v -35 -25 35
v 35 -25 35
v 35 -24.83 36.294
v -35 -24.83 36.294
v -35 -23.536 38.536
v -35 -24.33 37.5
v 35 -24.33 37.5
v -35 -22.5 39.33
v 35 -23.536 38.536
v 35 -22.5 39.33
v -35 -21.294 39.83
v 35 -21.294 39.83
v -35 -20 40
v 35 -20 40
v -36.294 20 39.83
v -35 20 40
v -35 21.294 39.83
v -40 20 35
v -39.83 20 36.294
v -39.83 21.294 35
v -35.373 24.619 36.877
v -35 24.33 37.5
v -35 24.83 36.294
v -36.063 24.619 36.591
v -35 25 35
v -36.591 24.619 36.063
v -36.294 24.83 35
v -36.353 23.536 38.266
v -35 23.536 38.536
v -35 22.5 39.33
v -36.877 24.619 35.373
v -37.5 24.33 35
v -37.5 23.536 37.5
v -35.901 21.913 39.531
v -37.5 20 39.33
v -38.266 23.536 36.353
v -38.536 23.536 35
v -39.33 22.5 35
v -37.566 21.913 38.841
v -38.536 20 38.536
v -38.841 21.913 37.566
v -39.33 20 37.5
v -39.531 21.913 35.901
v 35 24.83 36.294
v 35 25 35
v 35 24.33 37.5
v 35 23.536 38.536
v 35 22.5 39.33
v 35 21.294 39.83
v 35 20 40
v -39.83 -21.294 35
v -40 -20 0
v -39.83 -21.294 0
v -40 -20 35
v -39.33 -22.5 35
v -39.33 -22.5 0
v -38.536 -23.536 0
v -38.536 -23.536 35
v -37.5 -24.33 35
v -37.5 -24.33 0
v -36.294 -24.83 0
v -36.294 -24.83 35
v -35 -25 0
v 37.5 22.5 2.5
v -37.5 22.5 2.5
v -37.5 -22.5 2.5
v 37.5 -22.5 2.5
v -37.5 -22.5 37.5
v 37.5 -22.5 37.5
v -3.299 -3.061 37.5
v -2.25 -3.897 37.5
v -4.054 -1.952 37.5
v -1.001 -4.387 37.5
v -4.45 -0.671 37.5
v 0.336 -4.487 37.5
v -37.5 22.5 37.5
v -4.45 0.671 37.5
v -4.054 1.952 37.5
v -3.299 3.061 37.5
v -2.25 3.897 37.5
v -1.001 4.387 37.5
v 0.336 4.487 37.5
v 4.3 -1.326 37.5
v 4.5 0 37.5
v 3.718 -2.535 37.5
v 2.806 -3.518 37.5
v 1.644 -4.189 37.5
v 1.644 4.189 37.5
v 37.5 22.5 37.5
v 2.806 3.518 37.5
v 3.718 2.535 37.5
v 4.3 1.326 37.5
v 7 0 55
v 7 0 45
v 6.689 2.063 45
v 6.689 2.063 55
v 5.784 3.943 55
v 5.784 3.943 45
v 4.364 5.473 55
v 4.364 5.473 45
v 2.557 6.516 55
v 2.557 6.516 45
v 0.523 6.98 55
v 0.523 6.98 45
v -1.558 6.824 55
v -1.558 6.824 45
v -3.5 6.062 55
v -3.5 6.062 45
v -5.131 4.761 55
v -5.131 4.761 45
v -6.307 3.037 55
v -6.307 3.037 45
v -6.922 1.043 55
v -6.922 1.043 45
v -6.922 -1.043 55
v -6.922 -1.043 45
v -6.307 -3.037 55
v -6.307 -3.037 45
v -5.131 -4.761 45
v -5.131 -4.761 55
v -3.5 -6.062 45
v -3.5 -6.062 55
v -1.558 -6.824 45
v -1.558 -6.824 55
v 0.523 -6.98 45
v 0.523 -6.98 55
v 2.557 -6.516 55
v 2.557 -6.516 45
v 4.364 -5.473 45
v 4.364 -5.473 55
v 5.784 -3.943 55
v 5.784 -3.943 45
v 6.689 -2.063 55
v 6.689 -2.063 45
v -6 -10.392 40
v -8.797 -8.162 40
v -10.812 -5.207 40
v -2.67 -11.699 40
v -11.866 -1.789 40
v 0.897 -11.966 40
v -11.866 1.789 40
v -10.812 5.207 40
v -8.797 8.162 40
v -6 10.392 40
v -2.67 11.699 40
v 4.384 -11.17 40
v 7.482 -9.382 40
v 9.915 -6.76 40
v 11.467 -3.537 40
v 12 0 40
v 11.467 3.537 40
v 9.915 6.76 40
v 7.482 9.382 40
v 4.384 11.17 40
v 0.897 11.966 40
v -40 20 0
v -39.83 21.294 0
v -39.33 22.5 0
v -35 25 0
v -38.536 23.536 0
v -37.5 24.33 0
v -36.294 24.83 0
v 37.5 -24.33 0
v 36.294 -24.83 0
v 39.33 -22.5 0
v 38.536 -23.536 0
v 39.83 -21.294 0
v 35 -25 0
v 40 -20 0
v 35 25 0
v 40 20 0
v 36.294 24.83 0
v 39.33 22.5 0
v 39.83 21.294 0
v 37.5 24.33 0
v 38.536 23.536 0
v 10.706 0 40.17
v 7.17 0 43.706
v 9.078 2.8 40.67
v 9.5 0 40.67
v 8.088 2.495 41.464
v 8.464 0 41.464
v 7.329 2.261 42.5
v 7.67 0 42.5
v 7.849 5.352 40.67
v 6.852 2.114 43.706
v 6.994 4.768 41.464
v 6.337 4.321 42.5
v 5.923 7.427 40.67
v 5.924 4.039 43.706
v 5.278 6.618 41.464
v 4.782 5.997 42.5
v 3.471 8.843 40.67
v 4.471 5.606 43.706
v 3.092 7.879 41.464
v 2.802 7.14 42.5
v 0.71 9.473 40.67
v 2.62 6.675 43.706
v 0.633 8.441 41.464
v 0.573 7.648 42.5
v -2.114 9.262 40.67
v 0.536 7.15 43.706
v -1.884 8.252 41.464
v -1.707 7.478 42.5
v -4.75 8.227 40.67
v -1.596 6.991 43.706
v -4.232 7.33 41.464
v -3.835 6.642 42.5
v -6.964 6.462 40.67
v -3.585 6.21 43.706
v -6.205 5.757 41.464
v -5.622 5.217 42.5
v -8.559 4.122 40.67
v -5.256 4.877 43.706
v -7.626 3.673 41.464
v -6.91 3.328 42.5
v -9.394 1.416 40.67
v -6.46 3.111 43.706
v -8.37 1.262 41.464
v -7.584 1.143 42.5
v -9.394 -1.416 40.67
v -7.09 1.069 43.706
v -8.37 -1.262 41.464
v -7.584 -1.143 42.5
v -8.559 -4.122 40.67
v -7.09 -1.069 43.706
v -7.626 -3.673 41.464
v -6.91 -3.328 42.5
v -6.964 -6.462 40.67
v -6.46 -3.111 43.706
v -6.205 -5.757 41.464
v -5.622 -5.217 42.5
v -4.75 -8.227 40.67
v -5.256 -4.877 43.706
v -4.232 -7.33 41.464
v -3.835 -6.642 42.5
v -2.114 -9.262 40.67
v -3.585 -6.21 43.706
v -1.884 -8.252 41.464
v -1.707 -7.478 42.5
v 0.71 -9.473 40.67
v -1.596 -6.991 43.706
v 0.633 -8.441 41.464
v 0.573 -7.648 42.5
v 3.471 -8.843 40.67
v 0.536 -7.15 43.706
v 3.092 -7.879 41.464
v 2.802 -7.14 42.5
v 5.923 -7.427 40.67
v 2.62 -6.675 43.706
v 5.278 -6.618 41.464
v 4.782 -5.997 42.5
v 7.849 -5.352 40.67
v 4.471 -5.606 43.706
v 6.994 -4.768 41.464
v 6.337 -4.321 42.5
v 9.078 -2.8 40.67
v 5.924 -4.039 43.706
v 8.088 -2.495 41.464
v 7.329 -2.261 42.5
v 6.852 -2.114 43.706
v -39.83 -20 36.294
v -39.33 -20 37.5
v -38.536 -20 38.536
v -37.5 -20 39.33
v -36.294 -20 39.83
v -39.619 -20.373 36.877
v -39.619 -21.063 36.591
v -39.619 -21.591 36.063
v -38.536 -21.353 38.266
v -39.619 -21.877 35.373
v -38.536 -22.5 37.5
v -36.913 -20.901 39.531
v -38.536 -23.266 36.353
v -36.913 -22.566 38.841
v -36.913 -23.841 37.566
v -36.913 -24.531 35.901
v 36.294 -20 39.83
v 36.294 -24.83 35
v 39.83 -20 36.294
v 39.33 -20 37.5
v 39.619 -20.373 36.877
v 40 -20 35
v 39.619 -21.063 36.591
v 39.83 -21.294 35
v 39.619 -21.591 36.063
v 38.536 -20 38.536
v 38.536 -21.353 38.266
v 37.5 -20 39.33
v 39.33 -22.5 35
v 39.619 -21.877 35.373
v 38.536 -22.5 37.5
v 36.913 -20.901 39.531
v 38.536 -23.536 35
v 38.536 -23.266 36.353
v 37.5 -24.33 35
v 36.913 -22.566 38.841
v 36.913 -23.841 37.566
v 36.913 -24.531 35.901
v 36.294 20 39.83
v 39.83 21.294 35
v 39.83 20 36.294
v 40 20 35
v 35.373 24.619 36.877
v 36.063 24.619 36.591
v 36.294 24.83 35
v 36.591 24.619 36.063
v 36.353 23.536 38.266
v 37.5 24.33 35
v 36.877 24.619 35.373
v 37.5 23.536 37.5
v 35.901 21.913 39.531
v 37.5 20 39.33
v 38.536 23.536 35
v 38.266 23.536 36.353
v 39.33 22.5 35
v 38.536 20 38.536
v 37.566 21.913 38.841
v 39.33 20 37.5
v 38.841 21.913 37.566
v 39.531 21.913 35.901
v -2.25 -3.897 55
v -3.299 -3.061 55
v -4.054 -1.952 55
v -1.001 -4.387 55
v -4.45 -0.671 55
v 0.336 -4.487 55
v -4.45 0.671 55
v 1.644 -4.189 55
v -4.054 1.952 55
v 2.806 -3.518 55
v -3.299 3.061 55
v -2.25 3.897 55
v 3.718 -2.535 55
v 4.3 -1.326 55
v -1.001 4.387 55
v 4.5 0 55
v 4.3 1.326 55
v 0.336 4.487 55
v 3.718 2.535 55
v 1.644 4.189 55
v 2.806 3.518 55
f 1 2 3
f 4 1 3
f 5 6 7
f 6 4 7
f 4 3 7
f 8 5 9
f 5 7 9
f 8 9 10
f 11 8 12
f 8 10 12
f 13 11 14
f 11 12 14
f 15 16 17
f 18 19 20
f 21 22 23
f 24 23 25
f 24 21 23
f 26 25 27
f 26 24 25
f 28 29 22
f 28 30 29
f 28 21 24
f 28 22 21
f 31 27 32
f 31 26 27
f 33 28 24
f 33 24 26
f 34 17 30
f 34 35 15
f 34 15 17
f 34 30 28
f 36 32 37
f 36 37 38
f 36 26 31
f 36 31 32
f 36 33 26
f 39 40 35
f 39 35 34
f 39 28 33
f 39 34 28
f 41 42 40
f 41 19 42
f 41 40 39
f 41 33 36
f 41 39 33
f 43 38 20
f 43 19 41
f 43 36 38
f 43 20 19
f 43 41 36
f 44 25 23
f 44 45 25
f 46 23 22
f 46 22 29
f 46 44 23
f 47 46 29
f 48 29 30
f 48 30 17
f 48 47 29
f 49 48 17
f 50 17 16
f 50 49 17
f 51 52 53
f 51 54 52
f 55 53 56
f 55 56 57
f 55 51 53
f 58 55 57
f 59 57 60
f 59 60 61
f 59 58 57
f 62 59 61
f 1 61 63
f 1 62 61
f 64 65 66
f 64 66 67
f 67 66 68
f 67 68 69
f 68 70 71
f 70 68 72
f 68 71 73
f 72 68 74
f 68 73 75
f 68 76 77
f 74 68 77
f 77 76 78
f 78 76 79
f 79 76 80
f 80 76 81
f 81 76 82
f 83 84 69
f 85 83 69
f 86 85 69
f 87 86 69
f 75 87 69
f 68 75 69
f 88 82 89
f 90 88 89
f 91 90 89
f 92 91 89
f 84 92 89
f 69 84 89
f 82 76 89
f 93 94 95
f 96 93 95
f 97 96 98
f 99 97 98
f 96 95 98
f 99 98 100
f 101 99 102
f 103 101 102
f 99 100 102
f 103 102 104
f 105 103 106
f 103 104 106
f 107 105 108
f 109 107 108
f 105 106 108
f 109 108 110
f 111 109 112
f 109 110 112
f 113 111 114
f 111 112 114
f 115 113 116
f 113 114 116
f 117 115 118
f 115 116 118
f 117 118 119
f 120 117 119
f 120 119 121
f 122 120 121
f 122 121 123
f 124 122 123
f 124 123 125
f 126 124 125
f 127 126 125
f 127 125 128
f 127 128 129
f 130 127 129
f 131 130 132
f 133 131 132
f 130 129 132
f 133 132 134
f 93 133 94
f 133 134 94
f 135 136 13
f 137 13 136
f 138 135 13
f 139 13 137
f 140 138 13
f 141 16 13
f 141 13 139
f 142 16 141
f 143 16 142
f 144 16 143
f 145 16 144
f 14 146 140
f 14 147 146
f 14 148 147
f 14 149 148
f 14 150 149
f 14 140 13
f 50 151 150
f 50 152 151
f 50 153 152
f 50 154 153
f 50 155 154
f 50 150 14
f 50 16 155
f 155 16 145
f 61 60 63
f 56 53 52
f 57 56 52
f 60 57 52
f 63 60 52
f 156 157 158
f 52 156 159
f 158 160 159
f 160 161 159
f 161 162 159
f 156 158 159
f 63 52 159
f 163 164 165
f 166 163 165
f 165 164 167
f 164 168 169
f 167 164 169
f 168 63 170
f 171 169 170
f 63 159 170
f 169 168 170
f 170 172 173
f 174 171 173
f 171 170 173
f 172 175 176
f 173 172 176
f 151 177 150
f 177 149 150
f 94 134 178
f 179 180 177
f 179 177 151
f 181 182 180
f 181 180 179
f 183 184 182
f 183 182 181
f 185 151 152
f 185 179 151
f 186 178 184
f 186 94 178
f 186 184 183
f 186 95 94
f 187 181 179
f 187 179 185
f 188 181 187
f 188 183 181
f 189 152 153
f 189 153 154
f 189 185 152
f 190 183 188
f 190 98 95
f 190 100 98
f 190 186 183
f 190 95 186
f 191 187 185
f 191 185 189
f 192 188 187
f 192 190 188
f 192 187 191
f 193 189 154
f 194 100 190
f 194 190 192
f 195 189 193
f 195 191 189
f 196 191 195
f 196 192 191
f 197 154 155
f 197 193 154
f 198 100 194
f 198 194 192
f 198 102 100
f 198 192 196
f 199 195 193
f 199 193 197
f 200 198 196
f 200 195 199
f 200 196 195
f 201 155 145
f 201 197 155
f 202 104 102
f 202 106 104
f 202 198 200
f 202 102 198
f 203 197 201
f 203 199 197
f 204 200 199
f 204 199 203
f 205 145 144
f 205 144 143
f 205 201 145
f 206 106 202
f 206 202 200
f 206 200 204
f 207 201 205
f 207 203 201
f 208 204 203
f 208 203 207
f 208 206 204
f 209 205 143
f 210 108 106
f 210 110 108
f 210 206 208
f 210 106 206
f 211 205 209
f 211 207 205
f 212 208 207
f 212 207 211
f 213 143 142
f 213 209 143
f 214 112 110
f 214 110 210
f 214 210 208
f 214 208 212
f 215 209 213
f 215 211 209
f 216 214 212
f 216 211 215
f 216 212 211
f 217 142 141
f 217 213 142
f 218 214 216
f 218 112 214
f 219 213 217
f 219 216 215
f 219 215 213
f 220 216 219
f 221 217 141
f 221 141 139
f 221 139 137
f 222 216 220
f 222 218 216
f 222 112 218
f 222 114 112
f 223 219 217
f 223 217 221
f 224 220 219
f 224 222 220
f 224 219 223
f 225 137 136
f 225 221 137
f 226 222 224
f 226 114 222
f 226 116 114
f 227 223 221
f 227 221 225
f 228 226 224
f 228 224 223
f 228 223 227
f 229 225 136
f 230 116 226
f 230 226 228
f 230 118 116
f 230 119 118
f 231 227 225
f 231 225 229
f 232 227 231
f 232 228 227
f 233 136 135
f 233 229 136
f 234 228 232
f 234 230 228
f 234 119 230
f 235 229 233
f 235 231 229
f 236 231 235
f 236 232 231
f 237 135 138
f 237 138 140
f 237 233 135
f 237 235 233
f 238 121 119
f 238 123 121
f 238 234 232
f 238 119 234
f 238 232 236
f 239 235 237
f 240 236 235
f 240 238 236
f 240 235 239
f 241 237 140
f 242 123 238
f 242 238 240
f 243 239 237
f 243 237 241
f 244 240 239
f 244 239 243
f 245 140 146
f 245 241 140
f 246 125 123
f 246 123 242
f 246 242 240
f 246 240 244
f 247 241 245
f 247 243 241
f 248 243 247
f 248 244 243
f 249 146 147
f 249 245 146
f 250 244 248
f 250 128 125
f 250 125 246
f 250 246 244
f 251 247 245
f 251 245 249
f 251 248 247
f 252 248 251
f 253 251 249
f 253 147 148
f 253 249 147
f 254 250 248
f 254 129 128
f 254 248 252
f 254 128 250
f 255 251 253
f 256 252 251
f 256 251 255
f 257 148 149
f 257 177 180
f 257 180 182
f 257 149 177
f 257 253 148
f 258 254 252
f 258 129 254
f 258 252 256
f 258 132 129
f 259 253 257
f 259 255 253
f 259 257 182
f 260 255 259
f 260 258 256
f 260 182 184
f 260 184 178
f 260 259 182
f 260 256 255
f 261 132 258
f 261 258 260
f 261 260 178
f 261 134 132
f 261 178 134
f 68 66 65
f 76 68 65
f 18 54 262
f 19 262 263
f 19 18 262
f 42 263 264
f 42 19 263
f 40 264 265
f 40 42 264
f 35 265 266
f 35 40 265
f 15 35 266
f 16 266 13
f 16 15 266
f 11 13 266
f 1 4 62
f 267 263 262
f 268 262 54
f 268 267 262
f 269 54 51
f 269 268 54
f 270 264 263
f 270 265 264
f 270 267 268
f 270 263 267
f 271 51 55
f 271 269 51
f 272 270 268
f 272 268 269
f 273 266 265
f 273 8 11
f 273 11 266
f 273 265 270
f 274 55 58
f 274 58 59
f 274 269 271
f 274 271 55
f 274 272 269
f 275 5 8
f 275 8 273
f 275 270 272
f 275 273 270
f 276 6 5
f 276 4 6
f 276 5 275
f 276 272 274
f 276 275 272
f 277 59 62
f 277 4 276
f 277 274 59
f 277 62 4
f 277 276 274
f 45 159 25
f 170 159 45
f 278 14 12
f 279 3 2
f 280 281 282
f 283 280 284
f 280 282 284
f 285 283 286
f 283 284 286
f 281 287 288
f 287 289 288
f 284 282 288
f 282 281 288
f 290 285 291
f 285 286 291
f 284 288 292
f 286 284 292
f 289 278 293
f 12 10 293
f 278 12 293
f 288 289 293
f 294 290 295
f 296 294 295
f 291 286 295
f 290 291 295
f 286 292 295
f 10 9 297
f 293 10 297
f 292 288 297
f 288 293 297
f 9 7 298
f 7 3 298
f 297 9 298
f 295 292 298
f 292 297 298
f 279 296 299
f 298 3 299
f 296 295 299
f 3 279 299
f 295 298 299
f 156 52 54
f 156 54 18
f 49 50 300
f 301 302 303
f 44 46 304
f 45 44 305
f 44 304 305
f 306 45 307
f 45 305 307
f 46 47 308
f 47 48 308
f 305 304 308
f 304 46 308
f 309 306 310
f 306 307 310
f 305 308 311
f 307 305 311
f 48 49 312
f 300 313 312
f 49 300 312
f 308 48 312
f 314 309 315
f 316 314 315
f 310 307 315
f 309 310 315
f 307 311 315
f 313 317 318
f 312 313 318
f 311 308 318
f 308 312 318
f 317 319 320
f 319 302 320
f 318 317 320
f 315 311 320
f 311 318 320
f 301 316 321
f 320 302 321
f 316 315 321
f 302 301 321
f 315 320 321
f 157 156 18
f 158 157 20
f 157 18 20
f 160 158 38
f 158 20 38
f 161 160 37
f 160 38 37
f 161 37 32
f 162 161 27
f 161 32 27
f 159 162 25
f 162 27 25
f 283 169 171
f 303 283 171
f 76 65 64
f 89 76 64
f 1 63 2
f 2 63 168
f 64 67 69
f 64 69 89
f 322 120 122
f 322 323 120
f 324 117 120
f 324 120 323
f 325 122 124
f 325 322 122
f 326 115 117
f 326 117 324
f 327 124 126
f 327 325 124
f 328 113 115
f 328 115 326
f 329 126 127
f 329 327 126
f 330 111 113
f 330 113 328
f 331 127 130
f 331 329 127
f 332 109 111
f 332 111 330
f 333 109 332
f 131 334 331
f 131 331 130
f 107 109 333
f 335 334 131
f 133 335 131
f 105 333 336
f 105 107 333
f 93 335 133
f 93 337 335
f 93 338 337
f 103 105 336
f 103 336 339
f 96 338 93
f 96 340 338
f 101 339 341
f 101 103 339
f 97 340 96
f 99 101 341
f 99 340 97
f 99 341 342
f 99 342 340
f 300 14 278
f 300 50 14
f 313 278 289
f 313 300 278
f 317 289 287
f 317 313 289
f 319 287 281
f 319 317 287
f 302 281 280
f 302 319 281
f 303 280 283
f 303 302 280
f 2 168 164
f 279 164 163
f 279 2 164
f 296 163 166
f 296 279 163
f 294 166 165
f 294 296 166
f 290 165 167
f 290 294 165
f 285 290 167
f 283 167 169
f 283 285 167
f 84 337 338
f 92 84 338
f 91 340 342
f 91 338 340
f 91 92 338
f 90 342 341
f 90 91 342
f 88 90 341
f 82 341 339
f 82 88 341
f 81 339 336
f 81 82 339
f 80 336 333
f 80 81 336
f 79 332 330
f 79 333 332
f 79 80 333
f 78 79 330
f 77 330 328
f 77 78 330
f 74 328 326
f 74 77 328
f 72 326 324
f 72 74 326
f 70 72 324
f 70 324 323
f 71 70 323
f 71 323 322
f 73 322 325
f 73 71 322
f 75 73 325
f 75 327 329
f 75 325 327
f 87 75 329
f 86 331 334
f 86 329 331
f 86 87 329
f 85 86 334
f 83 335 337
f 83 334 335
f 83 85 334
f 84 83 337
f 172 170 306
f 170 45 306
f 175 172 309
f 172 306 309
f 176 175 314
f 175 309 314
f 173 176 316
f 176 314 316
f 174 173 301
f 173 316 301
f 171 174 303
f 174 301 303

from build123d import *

# Parameters (mm, degrees)
F0_W     = 80
F0_H     = 50
F1_DEPTH = 40
F2_R     = 7
F3_DEPTH = 15
F4_T     = -2.5
F5_R     = 5


with BuildPart() as f1:
    # F0 (on Top) → F1 (new body)
    with BuildSketch(Plane.XY):
        Rectangle(F0_W, F0_H)
    extrude(amount=F1_DEPTH)

    # F2 (on face) → F3 (join)
    with BuildSketch(Plane.XY.offset(40)):
        Circle(F2_R)
    extrude(amount=F3_DEPTH)

    # F4
    f4_openings = [f1.faces().sort_by_distance(p)[0] for p in [
        (0, 0, 55),
    ]]
    offset(amount=F4_T, openings=f4_openings, kind=Kind.INTERSECTION)

    # F5
    f5_edges = [f1.edges().sort_by_distance(p)[0] for p in [
        (-7, 0, 40),
        (0, -25, 40),
        (40, 0, 40),
        (-40, 0, 40),
        (0, 25, 40),
        (-40, -25, 20),
        (40, -25, 20),
        (-40, 25, 20),
        (40, 25, 20),
    ]]
    fillet(f5_edges, radius=F5_R)


solid = f1.part
